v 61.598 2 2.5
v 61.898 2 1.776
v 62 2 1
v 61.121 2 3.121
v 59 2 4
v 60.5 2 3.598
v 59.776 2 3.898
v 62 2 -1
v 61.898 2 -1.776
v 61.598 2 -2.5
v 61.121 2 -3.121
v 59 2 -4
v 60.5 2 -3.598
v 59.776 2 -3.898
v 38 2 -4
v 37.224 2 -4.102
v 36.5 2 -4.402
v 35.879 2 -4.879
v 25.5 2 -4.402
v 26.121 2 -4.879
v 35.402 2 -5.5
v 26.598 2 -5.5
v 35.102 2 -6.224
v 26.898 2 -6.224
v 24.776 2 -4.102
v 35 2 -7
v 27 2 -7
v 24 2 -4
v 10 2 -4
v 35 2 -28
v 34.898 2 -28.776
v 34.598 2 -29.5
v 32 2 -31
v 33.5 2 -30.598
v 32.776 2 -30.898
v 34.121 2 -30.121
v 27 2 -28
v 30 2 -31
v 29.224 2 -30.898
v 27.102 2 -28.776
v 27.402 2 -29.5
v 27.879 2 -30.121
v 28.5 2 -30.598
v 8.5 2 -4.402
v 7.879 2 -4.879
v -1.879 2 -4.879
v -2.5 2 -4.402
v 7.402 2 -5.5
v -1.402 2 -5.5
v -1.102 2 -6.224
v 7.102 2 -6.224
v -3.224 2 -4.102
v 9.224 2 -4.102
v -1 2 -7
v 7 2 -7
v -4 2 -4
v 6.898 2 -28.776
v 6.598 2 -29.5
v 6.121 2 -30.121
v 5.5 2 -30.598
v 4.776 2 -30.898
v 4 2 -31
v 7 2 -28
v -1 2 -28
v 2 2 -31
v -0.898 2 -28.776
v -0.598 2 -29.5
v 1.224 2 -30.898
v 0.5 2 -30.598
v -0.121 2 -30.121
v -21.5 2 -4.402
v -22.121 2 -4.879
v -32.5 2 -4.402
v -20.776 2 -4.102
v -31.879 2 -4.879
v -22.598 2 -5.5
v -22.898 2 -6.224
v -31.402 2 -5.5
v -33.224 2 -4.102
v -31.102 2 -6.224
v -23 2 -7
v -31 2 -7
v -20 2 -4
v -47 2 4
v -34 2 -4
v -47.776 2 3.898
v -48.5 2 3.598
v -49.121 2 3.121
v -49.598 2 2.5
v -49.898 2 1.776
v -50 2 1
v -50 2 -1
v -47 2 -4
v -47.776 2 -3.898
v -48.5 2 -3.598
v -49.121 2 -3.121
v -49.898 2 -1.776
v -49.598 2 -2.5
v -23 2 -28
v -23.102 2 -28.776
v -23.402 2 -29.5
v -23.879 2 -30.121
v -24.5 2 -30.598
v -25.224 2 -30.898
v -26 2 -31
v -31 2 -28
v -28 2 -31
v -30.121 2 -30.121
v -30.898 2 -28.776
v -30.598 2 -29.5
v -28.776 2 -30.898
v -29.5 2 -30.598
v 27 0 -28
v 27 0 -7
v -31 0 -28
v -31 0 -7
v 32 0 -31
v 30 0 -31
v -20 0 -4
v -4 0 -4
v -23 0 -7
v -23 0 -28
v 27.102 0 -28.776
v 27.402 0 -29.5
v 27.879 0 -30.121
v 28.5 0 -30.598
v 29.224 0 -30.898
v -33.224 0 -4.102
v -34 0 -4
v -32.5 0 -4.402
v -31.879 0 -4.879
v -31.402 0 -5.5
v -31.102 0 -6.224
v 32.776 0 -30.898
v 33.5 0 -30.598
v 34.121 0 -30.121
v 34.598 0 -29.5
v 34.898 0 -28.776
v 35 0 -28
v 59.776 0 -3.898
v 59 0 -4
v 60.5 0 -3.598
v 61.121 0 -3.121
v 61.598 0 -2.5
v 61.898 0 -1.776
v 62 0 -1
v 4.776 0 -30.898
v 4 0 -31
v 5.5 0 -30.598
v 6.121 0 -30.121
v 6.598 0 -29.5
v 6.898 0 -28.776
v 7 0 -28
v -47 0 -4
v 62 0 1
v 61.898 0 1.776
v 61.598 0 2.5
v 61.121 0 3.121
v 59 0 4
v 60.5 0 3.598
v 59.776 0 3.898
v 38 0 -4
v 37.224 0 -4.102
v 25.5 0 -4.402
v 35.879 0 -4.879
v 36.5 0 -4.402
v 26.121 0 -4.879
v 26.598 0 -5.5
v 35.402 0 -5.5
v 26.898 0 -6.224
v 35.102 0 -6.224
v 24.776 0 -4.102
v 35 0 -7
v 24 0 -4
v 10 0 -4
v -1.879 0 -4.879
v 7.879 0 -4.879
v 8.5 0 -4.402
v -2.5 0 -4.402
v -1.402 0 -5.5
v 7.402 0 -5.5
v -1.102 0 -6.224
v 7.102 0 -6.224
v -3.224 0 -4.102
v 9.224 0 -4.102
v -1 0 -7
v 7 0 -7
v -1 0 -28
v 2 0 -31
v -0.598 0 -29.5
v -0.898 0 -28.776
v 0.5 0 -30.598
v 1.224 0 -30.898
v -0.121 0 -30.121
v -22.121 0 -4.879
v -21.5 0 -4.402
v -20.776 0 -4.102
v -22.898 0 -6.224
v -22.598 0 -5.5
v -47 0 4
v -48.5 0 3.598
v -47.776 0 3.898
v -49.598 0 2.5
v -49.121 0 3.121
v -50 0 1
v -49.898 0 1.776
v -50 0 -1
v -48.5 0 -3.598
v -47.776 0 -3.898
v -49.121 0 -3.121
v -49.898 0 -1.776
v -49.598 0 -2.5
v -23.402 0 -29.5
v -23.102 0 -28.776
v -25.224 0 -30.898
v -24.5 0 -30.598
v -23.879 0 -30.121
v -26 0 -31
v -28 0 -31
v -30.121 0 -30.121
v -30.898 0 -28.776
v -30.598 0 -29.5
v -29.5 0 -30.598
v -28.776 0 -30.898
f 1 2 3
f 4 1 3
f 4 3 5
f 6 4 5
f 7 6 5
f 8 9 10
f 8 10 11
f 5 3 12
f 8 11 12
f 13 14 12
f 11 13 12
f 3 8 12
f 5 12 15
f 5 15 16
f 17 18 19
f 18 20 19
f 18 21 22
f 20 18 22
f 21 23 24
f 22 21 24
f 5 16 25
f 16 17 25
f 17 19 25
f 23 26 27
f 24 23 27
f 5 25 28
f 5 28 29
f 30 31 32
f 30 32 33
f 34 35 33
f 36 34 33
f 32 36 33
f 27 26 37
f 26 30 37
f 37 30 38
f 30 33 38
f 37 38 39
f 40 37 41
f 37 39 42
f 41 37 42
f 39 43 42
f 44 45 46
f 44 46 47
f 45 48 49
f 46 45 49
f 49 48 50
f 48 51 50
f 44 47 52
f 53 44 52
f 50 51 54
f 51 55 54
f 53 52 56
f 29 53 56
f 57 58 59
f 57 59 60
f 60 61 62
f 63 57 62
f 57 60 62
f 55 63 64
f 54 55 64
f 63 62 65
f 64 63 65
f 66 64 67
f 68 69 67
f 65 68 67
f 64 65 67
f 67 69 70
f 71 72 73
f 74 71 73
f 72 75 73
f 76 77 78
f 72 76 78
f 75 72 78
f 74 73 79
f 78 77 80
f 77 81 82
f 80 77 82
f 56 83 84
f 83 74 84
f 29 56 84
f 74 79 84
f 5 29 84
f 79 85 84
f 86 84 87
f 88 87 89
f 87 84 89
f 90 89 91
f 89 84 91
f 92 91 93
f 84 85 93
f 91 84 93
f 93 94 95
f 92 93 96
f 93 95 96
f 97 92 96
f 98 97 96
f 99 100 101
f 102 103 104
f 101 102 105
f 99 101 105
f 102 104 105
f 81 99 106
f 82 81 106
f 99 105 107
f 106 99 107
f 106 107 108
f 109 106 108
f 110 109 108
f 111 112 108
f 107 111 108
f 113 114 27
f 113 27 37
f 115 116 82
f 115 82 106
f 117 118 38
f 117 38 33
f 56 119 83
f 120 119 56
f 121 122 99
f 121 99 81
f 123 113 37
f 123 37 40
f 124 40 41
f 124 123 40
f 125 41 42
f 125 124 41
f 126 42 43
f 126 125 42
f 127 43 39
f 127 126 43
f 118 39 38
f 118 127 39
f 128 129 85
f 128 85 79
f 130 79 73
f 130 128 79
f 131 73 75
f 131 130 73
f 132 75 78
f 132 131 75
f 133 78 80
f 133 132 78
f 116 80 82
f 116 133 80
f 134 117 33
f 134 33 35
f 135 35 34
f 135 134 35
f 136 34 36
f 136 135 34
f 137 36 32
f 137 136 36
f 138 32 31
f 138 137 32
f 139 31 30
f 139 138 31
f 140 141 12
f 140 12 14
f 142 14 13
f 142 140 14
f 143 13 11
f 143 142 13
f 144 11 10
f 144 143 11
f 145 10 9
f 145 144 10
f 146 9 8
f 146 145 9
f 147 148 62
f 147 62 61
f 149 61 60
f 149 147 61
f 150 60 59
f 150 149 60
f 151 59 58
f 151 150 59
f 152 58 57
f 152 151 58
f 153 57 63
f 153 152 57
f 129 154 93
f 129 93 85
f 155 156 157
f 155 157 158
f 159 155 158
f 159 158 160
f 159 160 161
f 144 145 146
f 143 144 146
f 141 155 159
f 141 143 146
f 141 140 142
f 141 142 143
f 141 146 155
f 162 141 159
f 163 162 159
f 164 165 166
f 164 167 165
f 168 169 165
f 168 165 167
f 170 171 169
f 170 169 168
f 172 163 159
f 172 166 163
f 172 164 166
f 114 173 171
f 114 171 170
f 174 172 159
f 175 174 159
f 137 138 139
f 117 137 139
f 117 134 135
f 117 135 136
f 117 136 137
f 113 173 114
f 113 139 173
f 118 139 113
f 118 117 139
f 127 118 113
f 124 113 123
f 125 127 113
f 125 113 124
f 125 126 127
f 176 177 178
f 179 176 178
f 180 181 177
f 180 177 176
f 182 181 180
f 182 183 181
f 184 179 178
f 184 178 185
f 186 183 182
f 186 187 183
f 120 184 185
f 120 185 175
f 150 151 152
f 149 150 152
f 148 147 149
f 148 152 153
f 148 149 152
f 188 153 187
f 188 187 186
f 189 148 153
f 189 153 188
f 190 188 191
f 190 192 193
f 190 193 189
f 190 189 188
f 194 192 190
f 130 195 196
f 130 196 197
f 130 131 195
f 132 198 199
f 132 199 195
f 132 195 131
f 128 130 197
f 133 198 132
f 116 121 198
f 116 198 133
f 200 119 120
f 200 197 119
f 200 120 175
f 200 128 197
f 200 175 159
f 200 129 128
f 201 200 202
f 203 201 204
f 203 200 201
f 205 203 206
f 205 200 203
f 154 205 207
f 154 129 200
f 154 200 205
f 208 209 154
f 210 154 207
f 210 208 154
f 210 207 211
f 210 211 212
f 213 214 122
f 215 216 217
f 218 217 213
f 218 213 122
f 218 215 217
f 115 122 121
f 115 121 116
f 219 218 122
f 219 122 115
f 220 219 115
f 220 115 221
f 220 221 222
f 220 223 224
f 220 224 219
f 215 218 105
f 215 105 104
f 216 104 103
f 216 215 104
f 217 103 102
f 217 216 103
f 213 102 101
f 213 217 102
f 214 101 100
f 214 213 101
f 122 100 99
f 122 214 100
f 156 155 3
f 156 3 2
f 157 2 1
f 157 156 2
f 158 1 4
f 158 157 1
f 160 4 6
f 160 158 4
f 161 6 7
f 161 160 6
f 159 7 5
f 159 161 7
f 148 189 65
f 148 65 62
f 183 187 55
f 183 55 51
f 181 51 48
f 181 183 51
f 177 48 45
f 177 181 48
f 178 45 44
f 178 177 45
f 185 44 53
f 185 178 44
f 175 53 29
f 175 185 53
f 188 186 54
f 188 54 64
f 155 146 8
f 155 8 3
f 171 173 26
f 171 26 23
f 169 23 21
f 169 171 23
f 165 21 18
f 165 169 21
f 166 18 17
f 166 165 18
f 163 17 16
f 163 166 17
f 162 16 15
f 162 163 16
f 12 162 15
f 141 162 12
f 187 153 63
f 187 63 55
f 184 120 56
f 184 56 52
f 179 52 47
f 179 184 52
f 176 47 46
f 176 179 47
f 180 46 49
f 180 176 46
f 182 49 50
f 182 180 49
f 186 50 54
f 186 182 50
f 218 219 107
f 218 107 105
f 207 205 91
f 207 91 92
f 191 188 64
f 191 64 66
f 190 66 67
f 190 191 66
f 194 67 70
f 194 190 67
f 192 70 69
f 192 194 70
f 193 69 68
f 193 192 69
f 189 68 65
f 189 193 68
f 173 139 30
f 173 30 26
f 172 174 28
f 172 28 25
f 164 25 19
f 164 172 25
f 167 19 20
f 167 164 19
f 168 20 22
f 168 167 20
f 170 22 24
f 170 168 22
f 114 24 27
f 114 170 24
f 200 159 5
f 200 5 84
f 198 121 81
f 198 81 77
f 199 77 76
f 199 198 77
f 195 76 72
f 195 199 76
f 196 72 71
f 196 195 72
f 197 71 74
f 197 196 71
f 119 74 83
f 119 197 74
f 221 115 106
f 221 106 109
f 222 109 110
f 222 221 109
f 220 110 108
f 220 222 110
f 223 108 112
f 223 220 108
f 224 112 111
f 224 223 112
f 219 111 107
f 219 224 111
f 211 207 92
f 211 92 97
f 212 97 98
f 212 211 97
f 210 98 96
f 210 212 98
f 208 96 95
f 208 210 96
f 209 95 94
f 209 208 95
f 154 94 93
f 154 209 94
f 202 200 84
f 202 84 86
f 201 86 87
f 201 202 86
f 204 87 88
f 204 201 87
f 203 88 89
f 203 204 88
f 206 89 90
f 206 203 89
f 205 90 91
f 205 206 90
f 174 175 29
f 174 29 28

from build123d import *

# Parameters (mm, degrees)
BOSS_EXTRUDE1_DEPTH = 2


with BuildPart() as part:
    # Sketch1 → Boss-Extrude1 (new body)
    with BuildSketch(Plane(origin=(0, 0, 0), x_dir=(1, 0, 0), z_dir=(0, 1, 0))):
        with BuildLine():
            Line((-20, 4), (-4, 4))
            ThreePointArc((-4, 4), (-1.878679656, 4.878679656), (-1, 7))
            Line((-1, 7), (-1, 28))
            ThreePointArc((-1, 28), (-0.121320344, 30.121320344), (2, 31))
            Line((2, 31), (4, 31))
            ThreePointArc((4, 31), (6.121320344, 30.121320344), (7, 28))
            Line((7, 28), (7, 7))
            ThreePointArc((7, 7), (7.878679656, 4.878679656), (10, 4))
            Line((10, 4), (24, 4))
            ThreePointArc((24, 4), (26.121320344, 4.878679656), (27, 7))
            Line((27, 7), (27, 28))
            ThreePointArc((27, 28), (27.878679656, 30.121320344), (30, 31))
            Line((30, 31), (32, 31))
            ThreePointArc((32, 31), (34.121320344, 30.121320344), (35, 28))
            Line((35, 28), (35, 7))
            ThreePointArc((35, 7), (35.878679656, 4.878679656), (38, 4))
            Line((38, 4), (59, 4))
            ThreePointArc((59, 4), (61.121320344, 3.121320344), (62, 1))
            Line((62, 1), (62, -1))
            ThreePointArc((62, -1), (61.121320344, -3.121320344), (59, -4))
            Line((59, -4), (-47, -4))
            ThreePointArc((-47, -4), (-49.121320344, -3.121320344), (-50, -1))
            Line((-50, -1), (-50, 1))
            ThreePointArc((-50, 1), (-49.121320344, 3.121320344), (-47, 4))
            Line((-47, 4), (-34, 4))
            ThreePointArc((-34, 4), (-31.878679656, 4.878679656), (-31, 7))
            Line((-31, 7), (-31, 28))
            ThreePointArc((-31, 28), (-30.121320344, 30.121320344), (-28, 31))
            Line((-28, 31), (-26, 31))
            ThreePointArc((-26, 31), (-23.878679656, 30.121320344), (-23, 28))
            Line((-23, 28), (-23, 7))
            ThreePointArc((-23, 7), (-22.121320344, 4.878679656), (-20, 4))
        make_face()
    extrude(amount=BOSS_EXTRUDE1_DEPTH)


solid = part.part
